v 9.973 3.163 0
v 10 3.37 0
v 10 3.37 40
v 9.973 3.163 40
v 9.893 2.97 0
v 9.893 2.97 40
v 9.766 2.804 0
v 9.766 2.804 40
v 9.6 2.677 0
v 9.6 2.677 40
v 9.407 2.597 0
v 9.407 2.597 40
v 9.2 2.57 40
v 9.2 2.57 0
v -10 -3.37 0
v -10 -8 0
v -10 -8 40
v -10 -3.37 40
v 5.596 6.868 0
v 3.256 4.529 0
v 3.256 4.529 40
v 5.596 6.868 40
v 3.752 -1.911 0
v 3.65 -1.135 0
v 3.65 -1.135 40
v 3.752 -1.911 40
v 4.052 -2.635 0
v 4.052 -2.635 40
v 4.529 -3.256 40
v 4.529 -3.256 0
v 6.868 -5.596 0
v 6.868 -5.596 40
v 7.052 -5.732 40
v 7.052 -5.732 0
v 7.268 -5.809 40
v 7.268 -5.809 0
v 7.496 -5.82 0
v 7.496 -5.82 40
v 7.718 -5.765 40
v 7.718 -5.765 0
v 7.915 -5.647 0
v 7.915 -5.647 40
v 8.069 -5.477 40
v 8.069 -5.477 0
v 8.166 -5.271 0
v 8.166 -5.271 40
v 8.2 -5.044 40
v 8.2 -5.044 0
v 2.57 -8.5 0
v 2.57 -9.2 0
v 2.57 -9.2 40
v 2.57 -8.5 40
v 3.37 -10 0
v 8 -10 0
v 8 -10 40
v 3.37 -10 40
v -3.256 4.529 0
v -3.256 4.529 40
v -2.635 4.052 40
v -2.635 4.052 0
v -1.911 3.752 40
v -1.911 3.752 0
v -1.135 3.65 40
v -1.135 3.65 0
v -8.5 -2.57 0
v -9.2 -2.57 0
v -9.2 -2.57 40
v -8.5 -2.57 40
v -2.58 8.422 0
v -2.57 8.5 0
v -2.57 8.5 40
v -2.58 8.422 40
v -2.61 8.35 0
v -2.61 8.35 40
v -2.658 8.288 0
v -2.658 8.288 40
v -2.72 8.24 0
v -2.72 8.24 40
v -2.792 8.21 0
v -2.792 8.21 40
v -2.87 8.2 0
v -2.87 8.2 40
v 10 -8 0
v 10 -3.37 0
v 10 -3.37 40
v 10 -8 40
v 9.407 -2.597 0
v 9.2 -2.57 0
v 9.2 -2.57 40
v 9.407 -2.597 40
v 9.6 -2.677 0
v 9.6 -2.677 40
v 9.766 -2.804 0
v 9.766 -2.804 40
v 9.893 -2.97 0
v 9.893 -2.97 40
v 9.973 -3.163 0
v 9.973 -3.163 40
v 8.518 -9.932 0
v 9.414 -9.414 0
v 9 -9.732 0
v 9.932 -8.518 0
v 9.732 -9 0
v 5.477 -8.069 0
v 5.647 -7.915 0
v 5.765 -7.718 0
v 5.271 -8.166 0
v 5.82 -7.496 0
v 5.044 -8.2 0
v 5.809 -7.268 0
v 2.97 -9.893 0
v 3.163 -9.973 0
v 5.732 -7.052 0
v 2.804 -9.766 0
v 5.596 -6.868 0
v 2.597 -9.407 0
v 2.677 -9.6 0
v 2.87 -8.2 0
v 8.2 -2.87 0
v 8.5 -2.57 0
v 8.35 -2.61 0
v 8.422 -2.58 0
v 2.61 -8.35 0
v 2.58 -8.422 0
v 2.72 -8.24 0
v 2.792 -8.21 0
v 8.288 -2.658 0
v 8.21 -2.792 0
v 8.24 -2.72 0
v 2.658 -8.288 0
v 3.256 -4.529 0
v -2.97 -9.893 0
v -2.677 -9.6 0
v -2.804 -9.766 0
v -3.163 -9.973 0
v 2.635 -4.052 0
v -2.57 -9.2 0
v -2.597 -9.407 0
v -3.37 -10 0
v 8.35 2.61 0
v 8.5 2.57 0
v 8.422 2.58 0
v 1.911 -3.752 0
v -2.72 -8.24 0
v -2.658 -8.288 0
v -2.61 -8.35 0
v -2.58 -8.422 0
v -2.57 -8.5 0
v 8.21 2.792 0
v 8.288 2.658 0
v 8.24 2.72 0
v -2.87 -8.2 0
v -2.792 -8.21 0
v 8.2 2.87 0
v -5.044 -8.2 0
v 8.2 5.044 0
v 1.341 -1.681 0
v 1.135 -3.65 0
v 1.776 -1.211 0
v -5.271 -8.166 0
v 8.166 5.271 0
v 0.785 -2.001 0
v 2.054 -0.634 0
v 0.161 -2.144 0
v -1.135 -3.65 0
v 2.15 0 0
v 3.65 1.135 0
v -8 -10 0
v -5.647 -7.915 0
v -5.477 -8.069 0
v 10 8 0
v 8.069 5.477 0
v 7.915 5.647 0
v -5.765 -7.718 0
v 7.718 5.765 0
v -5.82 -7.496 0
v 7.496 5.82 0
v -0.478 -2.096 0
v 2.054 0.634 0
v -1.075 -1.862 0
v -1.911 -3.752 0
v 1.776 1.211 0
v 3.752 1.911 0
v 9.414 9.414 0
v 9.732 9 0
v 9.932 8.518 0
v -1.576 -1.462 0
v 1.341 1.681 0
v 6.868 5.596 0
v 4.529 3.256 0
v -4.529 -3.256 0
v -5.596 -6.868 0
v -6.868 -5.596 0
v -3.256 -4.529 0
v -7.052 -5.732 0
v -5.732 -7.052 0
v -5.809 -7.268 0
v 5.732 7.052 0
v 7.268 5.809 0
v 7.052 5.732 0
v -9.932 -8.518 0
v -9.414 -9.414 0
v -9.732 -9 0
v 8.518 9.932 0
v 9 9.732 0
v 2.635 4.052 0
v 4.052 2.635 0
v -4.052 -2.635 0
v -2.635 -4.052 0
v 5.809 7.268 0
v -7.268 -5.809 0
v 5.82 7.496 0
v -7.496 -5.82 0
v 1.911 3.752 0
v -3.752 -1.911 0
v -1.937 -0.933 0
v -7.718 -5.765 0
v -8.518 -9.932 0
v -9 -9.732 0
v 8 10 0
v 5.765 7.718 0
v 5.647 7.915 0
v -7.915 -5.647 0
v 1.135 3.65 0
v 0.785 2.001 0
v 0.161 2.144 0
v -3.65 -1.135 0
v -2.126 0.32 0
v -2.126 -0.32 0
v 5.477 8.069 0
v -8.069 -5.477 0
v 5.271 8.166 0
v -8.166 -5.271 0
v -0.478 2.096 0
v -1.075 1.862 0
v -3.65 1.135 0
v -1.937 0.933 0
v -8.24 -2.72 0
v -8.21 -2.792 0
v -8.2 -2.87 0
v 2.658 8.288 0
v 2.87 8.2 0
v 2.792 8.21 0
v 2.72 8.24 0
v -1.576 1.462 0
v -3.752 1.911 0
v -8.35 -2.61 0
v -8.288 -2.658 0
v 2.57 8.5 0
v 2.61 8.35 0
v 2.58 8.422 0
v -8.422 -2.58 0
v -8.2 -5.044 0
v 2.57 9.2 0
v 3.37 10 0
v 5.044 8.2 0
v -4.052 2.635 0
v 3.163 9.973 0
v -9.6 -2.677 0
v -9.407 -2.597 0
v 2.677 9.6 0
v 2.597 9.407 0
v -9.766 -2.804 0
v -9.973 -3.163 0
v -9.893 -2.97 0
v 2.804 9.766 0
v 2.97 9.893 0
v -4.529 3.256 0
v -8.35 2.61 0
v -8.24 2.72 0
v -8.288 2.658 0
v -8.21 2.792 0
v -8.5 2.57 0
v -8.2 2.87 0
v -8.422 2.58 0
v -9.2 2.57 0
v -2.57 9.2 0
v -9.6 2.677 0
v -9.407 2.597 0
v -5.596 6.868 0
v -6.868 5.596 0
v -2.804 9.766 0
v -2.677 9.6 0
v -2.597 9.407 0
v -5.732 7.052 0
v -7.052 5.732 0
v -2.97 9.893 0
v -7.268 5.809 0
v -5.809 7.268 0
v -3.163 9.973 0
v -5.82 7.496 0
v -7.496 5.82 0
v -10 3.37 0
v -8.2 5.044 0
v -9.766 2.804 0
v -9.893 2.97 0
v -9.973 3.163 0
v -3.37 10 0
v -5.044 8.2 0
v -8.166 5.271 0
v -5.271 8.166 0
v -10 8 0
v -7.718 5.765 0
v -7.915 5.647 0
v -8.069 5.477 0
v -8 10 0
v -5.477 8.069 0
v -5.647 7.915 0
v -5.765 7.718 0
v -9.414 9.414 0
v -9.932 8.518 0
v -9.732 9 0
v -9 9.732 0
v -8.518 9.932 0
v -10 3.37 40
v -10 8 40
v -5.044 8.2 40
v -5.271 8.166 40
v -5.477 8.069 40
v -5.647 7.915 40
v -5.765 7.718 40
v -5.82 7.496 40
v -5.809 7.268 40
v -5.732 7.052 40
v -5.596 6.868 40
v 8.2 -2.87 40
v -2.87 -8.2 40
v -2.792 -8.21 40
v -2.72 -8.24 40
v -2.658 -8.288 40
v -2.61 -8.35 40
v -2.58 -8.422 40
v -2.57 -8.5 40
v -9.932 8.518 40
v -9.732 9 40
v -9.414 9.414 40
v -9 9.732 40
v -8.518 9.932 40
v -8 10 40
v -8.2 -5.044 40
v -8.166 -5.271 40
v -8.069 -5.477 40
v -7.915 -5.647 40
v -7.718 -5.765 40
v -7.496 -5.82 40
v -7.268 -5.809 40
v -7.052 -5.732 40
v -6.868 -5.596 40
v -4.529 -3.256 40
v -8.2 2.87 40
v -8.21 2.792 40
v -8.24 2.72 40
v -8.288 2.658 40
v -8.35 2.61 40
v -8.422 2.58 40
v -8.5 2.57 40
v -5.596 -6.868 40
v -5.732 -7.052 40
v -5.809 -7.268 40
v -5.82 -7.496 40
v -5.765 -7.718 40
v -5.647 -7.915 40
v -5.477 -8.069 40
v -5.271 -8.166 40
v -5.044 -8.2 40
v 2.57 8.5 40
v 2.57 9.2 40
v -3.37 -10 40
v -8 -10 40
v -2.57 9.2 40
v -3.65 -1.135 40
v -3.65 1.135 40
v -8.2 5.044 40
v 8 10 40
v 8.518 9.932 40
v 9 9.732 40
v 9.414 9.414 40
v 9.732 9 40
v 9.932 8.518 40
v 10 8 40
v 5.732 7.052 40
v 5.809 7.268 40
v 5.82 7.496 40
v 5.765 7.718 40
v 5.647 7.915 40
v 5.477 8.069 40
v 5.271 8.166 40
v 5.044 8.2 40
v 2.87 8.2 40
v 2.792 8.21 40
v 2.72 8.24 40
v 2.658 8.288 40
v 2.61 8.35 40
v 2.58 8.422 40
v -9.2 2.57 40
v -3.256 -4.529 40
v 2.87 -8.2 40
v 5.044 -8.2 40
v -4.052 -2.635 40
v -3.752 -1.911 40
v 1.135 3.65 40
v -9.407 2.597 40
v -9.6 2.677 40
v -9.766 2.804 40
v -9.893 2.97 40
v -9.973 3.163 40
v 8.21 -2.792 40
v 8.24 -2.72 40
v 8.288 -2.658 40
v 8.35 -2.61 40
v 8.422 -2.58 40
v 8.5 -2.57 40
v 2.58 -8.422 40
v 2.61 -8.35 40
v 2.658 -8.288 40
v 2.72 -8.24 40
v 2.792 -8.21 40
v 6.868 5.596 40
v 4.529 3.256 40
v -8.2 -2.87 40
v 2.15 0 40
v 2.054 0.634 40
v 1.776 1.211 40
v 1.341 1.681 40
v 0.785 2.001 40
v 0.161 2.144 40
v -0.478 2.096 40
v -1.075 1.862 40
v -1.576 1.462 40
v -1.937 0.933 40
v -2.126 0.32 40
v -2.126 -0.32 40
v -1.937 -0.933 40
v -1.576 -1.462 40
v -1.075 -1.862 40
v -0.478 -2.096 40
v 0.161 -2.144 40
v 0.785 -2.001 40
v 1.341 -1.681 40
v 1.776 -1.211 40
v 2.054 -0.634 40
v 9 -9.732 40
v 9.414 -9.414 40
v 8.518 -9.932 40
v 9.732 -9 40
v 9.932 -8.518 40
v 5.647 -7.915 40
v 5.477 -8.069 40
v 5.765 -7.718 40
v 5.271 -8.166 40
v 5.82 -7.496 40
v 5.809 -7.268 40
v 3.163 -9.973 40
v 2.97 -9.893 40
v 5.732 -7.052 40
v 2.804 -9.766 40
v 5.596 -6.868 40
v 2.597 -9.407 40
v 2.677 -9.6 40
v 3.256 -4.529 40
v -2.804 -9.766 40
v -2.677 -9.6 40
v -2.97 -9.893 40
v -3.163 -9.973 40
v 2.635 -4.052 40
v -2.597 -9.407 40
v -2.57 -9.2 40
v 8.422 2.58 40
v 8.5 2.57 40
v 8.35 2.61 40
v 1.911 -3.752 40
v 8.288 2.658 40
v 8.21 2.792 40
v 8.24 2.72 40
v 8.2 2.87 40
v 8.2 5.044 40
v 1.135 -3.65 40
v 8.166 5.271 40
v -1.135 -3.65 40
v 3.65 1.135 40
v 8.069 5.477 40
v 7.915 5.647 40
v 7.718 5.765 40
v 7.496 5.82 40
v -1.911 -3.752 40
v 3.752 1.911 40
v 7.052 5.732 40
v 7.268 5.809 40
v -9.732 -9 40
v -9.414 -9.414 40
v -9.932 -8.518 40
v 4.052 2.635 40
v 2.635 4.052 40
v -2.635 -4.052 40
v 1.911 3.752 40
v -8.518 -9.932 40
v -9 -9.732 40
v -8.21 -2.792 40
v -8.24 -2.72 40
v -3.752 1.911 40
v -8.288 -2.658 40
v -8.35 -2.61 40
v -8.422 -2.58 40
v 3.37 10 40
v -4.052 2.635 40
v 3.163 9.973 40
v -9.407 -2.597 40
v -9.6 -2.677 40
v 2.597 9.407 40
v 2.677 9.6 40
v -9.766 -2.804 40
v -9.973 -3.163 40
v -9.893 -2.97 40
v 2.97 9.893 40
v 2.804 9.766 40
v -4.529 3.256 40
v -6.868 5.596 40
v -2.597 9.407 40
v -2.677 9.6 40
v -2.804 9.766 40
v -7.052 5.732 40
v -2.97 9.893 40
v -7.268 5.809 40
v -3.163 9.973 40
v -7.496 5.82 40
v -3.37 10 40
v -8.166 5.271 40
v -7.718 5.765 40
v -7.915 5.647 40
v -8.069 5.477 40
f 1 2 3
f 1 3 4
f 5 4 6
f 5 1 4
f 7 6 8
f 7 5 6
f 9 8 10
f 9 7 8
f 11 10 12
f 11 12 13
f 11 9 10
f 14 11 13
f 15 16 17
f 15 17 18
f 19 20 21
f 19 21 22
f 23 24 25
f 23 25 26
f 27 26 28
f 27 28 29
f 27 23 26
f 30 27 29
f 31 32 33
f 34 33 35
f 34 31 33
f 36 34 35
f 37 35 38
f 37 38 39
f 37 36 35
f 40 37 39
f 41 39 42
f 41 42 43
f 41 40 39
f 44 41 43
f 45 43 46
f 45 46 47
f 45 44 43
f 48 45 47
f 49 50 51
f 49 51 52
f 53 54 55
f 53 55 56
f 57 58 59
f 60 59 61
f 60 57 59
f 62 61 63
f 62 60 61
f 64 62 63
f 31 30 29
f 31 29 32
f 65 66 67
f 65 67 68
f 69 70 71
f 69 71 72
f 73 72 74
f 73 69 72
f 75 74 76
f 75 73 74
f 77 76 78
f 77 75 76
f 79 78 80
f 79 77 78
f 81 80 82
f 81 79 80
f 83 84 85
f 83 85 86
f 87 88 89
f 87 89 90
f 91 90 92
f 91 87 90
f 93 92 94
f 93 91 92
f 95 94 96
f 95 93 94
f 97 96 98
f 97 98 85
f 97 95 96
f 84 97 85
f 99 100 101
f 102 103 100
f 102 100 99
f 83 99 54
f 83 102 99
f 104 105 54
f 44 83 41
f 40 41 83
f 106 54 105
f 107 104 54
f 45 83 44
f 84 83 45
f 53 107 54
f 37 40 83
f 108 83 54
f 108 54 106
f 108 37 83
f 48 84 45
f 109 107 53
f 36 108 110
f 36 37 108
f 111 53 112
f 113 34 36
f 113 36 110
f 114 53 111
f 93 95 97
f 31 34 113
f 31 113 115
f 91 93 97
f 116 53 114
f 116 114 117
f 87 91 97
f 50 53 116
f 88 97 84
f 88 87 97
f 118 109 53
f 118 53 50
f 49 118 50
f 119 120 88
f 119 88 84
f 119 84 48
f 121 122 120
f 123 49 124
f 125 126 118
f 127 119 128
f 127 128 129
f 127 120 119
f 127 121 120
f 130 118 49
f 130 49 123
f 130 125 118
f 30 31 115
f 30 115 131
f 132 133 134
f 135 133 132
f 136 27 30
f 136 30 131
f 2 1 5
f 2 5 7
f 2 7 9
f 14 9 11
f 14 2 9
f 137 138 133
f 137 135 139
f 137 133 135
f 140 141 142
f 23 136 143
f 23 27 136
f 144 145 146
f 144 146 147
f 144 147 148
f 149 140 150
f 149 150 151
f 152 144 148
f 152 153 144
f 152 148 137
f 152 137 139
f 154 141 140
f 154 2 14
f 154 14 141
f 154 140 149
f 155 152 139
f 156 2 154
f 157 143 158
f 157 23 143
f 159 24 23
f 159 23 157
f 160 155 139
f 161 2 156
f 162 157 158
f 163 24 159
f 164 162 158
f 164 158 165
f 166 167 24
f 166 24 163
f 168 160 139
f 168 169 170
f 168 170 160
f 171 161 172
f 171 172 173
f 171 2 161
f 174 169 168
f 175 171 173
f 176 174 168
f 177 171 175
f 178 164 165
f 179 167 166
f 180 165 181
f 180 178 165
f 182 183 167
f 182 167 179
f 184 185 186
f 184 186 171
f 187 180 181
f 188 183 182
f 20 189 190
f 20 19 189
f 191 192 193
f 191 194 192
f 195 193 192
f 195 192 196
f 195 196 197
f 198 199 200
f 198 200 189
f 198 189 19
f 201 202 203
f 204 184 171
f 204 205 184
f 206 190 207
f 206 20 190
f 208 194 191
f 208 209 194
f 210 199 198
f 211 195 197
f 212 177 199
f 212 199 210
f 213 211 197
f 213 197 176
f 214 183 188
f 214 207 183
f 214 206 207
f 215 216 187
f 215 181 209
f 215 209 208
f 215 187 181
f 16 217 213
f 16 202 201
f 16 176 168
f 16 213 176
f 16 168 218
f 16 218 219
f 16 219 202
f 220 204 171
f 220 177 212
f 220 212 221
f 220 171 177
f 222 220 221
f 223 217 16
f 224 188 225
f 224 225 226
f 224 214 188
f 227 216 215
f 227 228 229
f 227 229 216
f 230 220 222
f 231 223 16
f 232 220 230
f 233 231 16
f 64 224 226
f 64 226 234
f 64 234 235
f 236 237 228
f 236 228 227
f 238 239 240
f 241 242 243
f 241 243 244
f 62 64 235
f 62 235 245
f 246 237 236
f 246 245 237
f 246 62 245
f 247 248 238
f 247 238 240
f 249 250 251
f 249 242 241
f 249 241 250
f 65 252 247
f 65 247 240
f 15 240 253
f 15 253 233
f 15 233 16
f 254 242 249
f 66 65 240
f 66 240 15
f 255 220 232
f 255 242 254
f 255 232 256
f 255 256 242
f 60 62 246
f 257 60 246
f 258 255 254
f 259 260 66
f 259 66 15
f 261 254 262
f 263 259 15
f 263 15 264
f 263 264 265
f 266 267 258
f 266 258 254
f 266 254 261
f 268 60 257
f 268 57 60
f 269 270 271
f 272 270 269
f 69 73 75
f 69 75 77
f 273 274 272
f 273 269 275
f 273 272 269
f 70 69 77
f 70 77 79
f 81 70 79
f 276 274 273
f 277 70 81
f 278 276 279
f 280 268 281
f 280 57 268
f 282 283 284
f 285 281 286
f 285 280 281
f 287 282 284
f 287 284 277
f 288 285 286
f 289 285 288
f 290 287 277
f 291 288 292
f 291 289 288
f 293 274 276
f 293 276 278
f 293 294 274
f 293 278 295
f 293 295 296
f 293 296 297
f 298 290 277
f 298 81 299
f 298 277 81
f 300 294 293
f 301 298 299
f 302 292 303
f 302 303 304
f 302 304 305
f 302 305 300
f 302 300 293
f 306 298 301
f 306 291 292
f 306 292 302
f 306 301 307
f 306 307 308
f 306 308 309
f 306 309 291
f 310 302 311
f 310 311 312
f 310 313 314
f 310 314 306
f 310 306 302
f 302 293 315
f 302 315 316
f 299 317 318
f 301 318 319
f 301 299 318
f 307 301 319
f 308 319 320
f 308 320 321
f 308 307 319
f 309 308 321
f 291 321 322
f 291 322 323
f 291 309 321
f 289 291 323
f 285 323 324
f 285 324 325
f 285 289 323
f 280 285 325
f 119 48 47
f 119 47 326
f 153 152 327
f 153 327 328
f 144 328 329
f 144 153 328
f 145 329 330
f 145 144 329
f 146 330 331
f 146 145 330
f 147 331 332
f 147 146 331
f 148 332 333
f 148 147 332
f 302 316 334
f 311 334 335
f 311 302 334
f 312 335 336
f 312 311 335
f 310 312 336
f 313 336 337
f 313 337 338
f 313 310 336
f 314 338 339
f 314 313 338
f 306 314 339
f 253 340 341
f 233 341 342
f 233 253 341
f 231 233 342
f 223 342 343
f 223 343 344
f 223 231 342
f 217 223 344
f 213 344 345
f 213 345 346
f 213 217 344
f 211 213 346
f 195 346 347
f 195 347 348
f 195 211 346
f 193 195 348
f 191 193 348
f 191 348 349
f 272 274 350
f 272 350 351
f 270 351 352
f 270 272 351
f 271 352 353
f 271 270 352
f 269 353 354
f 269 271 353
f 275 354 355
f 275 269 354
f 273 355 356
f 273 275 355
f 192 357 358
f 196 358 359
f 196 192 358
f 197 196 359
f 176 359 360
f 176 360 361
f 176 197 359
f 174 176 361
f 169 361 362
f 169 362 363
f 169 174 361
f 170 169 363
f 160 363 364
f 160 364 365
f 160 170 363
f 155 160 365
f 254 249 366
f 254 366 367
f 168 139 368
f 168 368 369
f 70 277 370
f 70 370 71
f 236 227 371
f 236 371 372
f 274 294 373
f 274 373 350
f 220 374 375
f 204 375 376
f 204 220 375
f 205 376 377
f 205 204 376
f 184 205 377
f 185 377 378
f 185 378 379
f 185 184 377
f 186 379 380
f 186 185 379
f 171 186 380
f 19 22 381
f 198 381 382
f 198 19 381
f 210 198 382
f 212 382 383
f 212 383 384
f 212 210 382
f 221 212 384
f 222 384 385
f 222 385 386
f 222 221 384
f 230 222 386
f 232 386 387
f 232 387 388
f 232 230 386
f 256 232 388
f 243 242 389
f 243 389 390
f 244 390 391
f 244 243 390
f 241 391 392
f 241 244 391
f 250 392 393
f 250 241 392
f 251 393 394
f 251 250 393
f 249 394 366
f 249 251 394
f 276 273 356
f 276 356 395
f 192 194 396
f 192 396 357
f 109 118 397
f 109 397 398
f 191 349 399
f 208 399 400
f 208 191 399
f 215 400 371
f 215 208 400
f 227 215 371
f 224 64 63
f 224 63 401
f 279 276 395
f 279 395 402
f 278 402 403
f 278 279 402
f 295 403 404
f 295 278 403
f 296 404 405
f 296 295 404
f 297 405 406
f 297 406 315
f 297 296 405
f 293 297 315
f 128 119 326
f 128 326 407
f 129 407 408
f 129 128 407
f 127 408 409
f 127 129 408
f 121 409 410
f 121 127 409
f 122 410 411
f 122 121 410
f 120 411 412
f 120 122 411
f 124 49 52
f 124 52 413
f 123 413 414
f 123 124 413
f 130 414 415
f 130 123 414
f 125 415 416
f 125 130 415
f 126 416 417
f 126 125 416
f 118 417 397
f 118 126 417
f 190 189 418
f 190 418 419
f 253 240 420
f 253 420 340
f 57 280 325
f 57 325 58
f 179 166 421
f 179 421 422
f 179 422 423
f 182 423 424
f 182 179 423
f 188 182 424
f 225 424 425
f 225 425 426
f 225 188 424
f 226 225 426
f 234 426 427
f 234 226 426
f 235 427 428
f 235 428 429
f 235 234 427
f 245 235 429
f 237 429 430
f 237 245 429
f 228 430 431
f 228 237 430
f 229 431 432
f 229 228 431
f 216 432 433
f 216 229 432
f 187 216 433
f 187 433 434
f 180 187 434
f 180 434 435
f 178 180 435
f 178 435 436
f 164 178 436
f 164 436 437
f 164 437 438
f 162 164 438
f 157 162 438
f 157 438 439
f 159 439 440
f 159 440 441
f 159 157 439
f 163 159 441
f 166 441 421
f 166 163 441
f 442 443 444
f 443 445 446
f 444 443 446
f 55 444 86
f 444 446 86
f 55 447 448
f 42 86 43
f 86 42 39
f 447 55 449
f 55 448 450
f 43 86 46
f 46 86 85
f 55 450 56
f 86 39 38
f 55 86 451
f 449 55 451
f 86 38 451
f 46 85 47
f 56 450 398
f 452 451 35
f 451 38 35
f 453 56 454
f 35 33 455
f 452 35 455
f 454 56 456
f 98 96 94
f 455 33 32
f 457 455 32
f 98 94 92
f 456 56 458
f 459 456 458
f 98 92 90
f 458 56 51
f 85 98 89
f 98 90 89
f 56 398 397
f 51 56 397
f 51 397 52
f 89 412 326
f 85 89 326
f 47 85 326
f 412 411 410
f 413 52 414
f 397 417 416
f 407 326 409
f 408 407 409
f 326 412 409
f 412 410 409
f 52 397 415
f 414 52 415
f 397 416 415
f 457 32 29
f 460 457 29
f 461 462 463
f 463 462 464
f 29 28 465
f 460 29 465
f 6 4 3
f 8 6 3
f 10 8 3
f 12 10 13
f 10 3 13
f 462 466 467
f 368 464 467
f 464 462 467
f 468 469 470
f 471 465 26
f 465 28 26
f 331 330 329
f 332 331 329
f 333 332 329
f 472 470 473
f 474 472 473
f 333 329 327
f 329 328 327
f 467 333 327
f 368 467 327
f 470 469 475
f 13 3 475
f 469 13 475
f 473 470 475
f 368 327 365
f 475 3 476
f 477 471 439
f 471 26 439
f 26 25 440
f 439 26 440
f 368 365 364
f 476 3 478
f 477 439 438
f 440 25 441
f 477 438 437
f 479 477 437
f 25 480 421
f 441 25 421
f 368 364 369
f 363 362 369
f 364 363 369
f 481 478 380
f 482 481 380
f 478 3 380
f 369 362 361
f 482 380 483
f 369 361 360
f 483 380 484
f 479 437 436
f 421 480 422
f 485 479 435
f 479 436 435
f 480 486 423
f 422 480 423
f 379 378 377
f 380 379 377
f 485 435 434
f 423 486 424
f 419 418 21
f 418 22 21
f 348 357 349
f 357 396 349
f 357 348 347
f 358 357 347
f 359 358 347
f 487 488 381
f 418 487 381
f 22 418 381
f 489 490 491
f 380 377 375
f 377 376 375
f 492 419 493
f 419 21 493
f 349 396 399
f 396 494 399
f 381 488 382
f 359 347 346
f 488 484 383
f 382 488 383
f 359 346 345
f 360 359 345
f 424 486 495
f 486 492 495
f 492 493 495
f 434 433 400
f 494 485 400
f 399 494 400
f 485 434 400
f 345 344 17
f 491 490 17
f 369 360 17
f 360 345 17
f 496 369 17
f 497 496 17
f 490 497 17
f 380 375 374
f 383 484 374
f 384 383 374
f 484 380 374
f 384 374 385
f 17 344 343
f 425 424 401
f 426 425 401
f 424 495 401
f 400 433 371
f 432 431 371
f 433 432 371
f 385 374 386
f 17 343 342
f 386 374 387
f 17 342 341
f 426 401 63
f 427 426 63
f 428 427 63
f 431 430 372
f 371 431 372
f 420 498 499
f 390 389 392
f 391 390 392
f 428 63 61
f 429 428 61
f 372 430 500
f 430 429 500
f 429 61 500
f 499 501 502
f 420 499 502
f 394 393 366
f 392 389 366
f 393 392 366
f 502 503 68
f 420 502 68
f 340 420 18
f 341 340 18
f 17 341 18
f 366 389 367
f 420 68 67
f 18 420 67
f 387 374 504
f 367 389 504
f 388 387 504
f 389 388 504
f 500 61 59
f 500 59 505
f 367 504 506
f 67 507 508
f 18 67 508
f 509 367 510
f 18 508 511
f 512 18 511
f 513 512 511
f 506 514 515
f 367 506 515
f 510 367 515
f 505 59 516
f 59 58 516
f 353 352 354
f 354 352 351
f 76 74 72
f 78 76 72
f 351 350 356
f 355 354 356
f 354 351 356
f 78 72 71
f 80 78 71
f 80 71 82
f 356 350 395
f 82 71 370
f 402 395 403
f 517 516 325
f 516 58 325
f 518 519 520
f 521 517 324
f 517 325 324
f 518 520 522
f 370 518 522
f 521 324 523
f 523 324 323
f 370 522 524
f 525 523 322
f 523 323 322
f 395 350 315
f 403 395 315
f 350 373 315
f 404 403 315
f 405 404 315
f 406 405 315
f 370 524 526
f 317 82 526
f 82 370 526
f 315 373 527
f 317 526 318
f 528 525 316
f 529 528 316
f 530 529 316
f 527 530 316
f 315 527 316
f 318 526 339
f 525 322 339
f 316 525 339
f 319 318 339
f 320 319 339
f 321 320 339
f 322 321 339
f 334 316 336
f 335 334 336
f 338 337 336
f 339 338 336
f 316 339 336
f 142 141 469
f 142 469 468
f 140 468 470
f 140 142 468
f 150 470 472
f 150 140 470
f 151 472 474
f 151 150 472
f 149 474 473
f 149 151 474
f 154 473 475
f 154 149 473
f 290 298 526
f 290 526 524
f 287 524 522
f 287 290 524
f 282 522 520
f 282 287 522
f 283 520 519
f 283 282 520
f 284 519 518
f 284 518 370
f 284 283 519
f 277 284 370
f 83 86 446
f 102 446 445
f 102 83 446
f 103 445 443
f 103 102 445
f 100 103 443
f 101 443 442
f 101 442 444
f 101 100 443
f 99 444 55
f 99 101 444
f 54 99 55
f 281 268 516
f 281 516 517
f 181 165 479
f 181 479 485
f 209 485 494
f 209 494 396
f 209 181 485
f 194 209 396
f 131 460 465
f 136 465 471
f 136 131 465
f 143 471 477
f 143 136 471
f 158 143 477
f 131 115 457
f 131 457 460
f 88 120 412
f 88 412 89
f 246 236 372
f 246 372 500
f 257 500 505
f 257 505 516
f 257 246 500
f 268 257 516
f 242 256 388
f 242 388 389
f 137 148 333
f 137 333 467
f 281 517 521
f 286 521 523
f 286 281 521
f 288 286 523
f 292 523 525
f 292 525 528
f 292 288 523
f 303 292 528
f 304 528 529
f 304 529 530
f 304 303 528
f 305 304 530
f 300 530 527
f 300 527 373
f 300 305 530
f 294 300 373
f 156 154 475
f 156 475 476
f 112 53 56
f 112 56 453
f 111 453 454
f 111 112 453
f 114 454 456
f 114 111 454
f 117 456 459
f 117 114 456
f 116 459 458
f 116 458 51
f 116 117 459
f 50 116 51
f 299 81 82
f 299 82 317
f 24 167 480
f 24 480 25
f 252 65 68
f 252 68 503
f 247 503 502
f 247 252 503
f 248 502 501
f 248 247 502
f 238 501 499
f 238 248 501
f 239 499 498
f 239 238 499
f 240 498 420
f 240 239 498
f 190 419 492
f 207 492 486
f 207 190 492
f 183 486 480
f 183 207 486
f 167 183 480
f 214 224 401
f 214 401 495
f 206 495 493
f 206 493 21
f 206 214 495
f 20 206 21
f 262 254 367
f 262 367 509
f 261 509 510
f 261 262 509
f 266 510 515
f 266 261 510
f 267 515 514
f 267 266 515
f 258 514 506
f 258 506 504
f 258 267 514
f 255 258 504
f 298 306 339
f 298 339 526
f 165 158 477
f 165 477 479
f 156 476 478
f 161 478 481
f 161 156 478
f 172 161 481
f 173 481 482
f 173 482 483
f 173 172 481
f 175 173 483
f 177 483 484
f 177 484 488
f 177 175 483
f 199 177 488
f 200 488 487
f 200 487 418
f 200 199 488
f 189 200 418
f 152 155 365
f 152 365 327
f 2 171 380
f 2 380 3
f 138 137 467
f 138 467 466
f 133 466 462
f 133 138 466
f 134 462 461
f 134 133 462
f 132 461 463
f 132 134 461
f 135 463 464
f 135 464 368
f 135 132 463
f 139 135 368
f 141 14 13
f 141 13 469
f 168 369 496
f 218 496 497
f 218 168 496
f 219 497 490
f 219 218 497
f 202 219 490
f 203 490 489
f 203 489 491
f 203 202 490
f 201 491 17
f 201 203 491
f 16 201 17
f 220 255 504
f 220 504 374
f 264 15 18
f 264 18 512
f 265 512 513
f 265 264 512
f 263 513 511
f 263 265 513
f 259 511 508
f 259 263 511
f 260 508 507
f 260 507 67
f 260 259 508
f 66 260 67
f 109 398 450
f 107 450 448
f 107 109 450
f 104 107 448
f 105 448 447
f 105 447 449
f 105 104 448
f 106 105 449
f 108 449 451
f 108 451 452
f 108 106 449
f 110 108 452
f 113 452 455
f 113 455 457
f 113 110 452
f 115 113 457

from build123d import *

# Parameters (mm, degrees)
CROQUIS1_R              = 2.15
SALIENTE_EXTRUIR1_DEPTH = 40


with BuildPart() as part:
    # Croquis1 → Saliente-Extruir1 (new body)
    with BuildSketch(Plane.XY):
        with BuildLine():
            Line((3.65, 1.134567107), (3.65, -1.134567107))
            ThreePointArc((3.65, -1.134567107), (3.878361402, -2.282617404), (4.528679656, -3.25588745))
            Line((4.528679656, -3.25588745), (6.868456711, -5.595664505))
            ThreePointArc((6.868456711, -5.595664505), (7.718493077, -5.764747251), (8.2, -5.044121215))
            Line((8.2, -5.044121215), (8.2, -2.87))
            ThreePointArc((8.2, -2.87), (8.287867966, -2.657867966), (8.5, -2.57))
            Line((8.5, -2.57), (9.2, -2.57))
            ThreePointArc((9.2, -2.57), (9.765685425, -2.804314575), (10, -3.37))
            Line((10, -3.37), (10, -8))
            ThreePointArc((10, -8), (9.414213562, -9.414213562), (8, -10))
            Line((8, -10), (3.37, -10))
            ThreePointArc((3.37, -10), (2.804314575, -9.765685425), (2.57, -9.2))
            Line((2.57, -9.2), (2.57, -8.5))
            ThreePointArc((2.57, -8.5), (2.657867966, -8.287867966), (2.87, -8.2))
            Line((2.87, -8.2), (5.044121215, -8.2))
            ThreePointArc((5.044121215, -8.2), (5.764747251, -7.718493077), (5.595664505, -6.868456711))
            Line((5.595664505, -6.868456711), (3.25588745, -4.528679656))
            ThreePointArc((3.25588745, -4.528679656), (2.282617404, -3.878361402), (1.134567107, -3.65))
            Line((1.134567107, -3.65), (-1.134567107, -3.65))
            ThreePointArc((-1.134567107, -3.65), (-2.282617404, -3.878361402), (-3.25588745, -4.528679656))
            Line((-3.25588745, -4.528679656), (-5.595664505, -6.868456711))
            ThreePointArc((-5.595664505, -6.868456711), (-5.764747251, -7.718493077), (-5.044121215, -8.2))
            Line((-5.044121215, -8.2), (-2.87, -8.2))
            ThreePointArc((-2.87, -8.2), (-2.657867966, -8.287867966), (-2.57, -8.5))
            Line((-2.57, -8.5), (-2.57, -9.2))
            ThreePointArc((-2.57, -9.2), (-2.804314575, -9.765685425), (-3.37, -10))
            Line((-3.37, -10), (-8, -10))
            ThreePointArc((-8, -10), (-9.414213562, -9.414213562), (-10, -8))
            Line((-10, -8), (-10, -3.37))
            ThreePointArc((-10, -3.37), (-9.765685425, -2.804314575), (-9.2, -2.57))
            Line((-9.2, -2.57), (-8.5, -2.57))
            ThreePointArc((-8.5, -2.57), (-8.287867966, -2.657867966), (-8.2, -2.87))
            Line((-8.2, -2.87), (-8.2, -5.044121215))
            ThreePointArc((-8.2, -5.044121215), (-7.718493077, -5.764747251), (-6.868456711, -5.595664505))
            Line((-6.868456711, -5.595664505), (-4.528679656, -3.25588745))
            ThreePointArc((-4.528679656, -3.25588745), (-3.878361402, -2.282617404), (-3.65, -1.134567107))
            Line((-3.65, -1.134567107), (-3.65, 1.134567107))
            ThreePointArc((-3.65, 1.134567107), (-3.878361402, 2.282617404), (-4.528679656, 3.25588745))
            Line((-4.528679656, 3.25588745), (-6.868456711, 5.595664505))
            ThreePointArc((-6.868456711, 5.595664505), (-7.718493077, 5.764747251), (-8.2, 5.044121215))
            Line((-8.2, 5.044121215), (-8.2, 2.87))
            ThreePointArc((-8.2, 2.87), (-8.287867966, 2.657867966), (-8.5, 2.57))
            Line((-8.5, 2.57), (-9.2, 2.57))
            ThreePointArc((-9.2, 2.57), (-9.765685425, 2.804314575), (-10, 3.37))
            Line((-10, 3.37), (-10, 8))
            ThreePointArc((-10, 8), (-9.414213562, 9.414213562), (-8, 10))
            Line((-8, 10), (-3.37, 10))
            ThreePointArc((-3.37, 10), (-2.804314575, 9.765685425), (-2.57, 9.2))
            Line((-2.57, 9.2), (-2.57, 8.5))
            ThreePointArc((-2.57, 8.5), (-2.657867966, 8.287867966), (-2.87, 8.2))
            Line((-2.87, 8.2), (-5.044121215, 8.2))
            ThreePointArc((-5.044121215, 8.2), (-5.764747251, 7.718493077), (-5.595664505, 6.868456711))
            Line((-5.595664505, 6.868456711), (-3.25588745, 4.528679656))
            ThreePointArc((-3.25588745, 4.528679656), (-2.282617404, 3.878361402), (-1.134567107, 3.65))
            Line((-1.134567107, 3.65), (1.134567107, 3.65))
            ThreePointArc((1.134567107, 3.65), (2.282617404, 3.878361402), (3.25588745, 4.528679656))
            Line((3.25588745, 4.528679656), (5.595664505, 6.868456711))
            ThreePointArc((5.595664505, 6.868456711), (5.764747251, 7.718493077), (5.044121215, 8.2))
            Line((5.044121215, 8.2), (2.87, 8.2))
            ThreePointArc((2.87, 8.2), (2.657867966, 8.287867966), (2.57, 8.5))
            Line((2.57, 8.5), (2.57, 9.2))
            ThreePointArc((2.57, 9.2), (2.804314575, 9.765685425), (3.37, 10))
            Line((3.37, 10), (8, 10))
            ThreePointArc((8, 10), (9.414213562, 9.414213562), (10, 8))
            Line((10, 8), (10, 3.37))
            ThreePointArc((10, 3.37), (9.765685425, 2.804314575), (9.2, 2.57))
            Line((9.2, 2.57), (8.5, 2.57))
            ThreePointArc((8.5, 2.57), (8.287867966, 2.657867966), (8.2, 2.87))
            Line((8.2, 2.87), (8.2, 5.044121215))
            ThreePointArc((8.2, 5.044121215), (7.718493077, 5.764747251), (6.868456711, 5.595664505))
            Line((6.868456711, 5.595664505), (4.528679656, 3.25588745))
            ThreePointArc((4.528679656, 3.25588745), (3.878361402, 2.282617404), (3.65, 1.134567107))
        make_face()
        Circle(CROQUIS1_R, mode=Mode.SUBTRACT)
    extrude(amount=SALIENTE_EXTRUIR1_DEPTH)


solid = part.part
